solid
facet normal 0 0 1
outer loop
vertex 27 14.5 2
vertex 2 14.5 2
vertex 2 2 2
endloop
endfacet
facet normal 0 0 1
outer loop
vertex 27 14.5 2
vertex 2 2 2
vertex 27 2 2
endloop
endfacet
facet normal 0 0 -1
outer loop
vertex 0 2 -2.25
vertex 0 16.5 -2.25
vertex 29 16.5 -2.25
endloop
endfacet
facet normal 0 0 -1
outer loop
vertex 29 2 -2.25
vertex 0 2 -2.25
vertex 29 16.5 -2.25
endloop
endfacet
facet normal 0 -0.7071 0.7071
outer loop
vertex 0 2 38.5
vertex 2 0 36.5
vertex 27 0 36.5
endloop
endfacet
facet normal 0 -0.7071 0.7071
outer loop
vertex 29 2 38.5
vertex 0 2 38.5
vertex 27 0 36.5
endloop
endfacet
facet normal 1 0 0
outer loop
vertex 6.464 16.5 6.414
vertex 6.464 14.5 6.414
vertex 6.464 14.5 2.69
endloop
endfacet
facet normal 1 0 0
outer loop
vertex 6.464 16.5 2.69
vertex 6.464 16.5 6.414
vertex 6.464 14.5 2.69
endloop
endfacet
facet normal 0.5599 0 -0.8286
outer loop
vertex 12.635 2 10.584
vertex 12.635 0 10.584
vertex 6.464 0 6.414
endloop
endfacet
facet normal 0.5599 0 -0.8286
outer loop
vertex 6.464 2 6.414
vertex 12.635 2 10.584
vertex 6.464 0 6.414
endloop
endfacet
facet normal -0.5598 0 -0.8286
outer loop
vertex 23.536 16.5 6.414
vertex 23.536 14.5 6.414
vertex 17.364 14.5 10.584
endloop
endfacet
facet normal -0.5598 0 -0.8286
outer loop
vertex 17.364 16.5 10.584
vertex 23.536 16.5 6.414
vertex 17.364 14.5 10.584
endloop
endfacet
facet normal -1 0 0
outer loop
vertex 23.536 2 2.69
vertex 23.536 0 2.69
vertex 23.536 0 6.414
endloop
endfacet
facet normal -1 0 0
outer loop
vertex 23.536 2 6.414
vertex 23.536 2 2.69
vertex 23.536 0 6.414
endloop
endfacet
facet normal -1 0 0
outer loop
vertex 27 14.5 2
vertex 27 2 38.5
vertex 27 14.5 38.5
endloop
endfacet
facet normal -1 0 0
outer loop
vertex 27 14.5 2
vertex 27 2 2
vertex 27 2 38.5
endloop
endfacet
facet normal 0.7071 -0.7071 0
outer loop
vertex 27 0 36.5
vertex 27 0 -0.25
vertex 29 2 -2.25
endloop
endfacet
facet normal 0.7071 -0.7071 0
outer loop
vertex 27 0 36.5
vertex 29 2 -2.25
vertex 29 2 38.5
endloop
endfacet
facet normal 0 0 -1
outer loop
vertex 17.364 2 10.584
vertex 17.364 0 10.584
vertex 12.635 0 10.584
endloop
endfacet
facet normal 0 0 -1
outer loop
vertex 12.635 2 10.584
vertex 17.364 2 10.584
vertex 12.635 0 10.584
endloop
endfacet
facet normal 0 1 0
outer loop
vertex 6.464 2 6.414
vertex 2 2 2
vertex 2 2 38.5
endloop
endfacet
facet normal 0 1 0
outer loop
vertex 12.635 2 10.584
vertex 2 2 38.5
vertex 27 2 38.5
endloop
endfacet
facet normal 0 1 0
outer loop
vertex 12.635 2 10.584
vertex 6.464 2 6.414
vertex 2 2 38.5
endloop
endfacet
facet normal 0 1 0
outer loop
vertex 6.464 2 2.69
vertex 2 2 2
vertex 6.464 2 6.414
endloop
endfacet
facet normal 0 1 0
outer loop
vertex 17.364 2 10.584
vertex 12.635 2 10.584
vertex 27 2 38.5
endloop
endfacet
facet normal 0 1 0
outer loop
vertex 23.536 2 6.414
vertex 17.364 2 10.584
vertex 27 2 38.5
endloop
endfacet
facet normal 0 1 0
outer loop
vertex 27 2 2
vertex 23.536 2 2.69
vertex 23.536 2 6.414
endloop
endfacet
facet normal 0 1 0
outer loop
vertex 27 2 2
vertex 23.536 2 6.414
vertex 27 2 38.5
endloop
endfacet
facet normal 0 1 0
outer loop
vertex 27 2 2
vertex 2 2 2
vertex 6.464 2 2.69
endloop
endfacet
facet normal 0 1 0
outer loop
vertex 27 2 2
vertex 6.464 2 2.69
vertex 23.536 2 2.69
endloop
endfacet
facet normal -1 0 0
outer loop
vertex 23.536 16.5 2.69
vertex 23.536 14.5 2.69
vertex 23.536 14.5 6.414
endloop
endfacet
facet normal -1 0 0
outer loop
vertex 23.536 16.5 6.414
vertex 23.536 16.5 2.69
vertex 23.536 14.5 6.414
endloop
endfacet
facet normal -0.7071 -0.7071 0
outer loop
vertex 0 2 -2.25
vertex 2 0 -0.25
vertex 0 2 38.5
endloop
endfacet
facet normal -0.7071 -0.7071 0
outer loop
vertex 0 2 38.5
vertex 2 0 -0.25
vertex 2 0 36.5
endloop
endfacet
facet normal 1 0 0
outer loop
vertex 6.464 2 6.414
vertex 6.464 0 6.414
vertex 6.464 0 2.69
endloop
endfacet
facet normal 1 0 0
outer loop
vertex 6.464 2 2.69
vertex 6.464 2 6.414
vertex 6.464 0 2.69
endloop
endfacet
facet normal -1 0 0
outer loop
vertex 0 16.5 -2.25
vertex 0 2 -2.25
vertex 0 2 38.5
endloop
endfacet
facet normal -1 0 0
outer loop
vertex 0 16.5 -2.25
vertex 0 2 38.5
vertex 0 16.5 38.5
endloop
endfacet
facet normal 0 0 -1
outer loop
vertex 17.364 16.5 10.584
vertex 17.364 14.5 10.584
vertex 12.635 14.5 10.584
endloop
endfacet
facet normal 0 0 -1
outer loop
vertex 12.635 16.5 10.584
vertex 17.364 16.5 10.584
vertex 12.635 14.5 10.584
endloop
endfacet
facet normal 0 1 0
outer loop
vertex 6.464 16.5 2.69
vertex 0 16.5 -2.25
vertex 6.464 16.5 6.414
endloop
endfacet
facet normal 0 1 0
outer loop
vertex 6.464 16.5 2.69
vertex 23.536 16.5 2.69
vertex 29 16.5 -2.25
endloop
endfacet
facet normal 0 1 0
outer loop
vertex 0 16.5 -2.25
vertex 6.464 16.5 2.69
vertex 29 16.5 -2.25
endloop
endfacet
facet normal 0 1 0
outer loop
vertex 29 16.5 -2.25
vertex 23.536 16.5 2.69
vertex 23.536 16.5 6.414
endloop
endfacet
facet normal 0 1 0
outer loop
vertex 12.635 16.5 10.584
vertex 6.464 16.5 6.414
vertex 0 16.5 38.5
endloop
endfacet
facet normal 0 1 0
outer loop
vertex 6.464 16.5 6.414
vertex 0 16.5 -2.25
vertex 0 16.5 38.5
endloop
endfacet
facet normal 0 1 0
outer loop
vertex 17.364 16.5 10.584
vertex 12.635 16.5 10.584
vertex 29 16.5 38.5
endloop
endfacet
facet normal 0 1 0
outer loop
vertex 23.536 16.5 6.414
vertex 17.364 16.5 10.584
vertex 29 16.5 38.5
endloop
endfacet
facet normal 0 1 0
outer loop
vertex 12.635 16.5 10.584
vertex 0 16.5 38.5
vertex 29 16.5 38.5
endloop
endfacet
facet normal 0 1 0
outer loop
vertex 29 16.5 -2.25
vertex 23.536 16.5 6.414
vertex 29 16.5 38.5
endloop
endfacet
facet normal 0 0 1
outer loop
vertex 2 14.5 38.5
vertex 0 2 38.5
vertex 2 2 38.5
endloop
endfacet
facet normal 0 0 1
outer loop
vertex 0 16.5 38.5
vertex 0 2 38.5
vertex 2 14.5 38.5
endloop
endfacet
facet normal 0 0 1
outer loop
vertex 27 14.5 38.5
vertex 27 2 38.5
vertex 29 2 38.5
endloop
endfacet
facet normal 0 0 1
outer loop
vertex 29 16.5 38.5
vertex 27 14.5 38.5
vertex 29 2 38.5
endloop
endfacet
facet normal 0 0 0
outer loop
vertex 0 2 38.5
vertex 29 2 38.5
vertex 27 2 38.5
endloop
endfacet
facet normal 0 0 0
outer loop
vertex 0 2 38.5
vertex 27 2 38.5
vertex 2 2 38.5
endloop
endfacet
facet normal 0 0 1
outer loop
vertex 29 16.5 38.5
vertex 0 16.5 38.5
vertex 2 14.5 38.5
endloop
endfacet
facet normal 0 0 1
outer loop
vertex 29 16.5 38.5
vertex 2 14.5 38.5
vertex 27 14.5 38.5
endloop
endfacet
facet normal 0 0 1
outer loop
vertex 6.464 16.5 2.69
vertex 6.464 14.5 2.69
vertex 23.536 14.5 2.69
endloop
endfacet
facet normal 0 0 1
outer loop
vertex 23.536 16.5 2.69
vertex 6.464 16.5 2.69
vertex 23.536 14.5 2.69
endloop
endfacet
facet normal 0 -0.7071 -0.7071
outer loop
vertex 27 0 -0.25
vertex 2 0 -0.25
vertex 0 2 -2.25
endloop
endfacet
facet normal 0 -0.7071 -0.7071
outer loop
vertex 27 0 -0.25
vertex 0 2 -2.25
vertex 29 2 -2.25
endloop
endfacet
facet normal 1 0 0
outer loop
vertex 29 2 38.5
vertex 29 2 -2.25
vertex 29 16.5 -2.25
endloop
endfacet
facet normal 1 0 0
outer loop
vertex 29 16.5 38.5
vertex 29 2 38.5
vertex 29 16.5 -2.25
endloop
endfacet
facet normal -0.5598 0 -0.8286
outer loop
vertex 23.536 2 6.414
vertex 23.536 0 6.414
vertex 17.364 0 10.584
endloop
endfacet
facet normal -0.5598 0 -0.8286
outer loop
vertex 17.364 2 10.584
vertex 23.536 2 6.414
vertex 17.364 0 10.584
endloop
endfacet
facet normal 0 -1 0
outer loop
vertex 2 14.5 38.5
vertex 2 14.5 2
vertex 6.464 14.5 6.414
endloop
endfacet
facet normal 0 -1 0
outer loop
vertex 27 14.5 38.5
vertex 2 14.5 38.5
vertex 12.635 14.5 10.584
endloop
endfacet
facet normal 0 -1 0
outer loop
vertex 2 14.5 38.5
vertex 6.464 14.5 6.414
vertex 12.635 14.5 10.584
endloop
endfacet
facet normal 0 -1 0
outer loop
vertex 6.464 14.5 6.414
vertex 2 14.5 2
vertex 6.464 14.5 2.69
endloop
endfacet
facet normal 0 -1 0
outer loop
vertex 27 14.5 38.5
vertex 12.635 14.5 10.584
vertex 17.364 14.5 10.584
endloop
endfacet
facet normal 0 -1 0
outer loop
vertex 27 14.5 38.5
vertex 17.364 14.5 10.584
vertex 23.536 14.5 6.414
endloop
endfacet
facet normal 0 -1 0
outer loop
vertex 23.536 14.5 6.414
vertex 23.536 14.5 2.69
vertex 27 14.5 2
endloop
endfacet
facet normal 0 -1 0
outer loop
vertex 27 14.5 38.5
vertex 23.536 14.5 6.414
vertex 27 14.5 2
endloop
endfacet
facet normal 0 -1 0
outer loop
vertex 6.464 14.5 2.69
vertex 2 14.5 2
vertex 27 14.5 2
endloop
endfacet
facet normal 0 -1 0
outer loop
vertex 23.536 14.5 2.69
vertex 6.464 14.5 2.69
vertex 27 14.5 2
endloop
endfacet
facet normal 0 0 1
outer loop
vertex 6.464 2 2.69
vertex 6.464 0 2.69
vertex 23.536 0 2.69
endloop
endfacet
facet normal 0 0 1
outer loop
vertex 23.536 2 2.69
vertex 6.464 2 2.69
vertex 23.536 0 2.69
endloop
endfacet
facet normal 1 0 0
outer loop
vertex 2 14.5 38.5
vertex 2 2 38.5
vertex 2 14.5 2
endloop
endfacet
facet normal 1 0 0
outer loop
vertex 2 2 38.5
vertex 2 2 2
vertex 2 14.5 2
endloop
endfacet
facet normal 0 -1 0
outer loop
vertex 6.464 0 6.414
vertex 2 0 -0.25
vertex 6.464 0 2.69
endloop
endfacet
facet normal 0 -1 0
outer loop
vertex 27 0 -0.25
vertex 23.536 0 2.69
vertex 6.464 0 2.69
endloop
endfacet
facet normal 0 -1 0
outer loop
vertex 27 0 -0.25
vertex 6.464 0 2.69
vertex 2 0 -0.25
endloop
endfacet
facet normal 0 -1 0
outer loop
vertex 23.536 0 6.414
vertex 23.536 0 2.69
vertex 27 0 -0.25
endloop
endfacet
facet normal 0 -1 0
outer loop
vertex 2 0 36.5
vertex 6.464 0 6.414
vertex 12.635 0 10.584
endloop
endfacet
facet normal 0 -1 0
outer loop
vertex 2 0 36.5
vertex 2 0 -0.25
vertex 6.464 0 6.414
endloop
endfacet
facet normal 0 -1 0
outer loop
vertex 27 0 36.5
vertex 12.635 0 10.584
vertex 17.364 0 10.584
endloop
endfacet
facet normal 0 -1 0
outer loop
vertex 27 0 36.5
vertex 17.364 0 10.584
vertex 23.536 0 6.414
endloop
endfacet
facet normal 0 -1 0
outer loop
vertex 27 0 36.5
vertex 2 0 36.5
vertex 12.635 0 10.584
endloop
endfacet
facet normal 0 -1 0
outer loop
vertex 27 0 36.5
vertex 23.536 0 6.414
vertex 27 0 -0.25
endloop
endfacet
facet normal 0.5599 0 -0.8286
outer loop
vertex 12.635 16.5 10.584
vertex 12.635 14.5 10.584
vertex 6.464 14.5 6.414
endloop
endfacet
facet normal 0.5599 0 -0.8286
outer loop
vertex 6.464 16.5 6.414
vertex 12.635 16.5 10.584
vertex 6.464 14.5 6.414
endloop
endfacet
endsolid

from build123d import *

# Parameters (mm, degrees)
F0_W     = 29
F0_H     = 16.5
F1_DEPTH = 38.5
F2_T     = -2
F3_DEPTH = 2.25
F4_SIZE  = 1.99999
F6_DEPTH = 25


# Not quite as in the source:
# - a fillet or chamfer is up to 0.001 mm smaller than in the source, because OpenCascade refuses the exact size


with BuildPart() as f1:
    # F0 (on Top) → F1 (new body)
    with BuildSketch(Plane.XY):
        with Locations((14.5, 8.25)):
            Rectangle(F0_W, F0_H)
    extrude(amount=F1_DEPTH)

    # F2
    f2_openings = [f1.faces().sort_by_distance(p)[0] for p in [
        (14.5, 8.25, 38.5),
    ]]
    offset(amount=F2_T, openings=f2_openings)

    # F3 (add): a face of the model
    f3_faces = [f1.faces().sort_by_distance(p)[0] for p in [
        (14.5, 8.25, 0),
    ]]
    extrude(f3_faces, amount=F3_DEPTH)

    # F4 (size 2 in the source; OpenCascade refuses exactly that, so slightly less here)
    f4_edges = [f1.edges().sort_by_distance(p)[0] for p in [
        (29, 0, 18.125),
        (0, 0, 18.125),
        (14.5, 0, 38.5),
        (14.5, 0, -2.25),
    ]]
    chamfer(f4_edges, length=F4_SIZE)

    # F5 (on face) → F6 (cut)
    with BuildSketch(Plane.XZ):
        Polygon((17.364, 10.584), (12.635, 10.584), (6.464, 6.414), (6.464, 2.69), (23.536, 2.69), (23.536, 6.414), align=None)
    extrude(amount=-F6_DEPTH, mode=Mode.SUBTRACT)


solid = f1.part
